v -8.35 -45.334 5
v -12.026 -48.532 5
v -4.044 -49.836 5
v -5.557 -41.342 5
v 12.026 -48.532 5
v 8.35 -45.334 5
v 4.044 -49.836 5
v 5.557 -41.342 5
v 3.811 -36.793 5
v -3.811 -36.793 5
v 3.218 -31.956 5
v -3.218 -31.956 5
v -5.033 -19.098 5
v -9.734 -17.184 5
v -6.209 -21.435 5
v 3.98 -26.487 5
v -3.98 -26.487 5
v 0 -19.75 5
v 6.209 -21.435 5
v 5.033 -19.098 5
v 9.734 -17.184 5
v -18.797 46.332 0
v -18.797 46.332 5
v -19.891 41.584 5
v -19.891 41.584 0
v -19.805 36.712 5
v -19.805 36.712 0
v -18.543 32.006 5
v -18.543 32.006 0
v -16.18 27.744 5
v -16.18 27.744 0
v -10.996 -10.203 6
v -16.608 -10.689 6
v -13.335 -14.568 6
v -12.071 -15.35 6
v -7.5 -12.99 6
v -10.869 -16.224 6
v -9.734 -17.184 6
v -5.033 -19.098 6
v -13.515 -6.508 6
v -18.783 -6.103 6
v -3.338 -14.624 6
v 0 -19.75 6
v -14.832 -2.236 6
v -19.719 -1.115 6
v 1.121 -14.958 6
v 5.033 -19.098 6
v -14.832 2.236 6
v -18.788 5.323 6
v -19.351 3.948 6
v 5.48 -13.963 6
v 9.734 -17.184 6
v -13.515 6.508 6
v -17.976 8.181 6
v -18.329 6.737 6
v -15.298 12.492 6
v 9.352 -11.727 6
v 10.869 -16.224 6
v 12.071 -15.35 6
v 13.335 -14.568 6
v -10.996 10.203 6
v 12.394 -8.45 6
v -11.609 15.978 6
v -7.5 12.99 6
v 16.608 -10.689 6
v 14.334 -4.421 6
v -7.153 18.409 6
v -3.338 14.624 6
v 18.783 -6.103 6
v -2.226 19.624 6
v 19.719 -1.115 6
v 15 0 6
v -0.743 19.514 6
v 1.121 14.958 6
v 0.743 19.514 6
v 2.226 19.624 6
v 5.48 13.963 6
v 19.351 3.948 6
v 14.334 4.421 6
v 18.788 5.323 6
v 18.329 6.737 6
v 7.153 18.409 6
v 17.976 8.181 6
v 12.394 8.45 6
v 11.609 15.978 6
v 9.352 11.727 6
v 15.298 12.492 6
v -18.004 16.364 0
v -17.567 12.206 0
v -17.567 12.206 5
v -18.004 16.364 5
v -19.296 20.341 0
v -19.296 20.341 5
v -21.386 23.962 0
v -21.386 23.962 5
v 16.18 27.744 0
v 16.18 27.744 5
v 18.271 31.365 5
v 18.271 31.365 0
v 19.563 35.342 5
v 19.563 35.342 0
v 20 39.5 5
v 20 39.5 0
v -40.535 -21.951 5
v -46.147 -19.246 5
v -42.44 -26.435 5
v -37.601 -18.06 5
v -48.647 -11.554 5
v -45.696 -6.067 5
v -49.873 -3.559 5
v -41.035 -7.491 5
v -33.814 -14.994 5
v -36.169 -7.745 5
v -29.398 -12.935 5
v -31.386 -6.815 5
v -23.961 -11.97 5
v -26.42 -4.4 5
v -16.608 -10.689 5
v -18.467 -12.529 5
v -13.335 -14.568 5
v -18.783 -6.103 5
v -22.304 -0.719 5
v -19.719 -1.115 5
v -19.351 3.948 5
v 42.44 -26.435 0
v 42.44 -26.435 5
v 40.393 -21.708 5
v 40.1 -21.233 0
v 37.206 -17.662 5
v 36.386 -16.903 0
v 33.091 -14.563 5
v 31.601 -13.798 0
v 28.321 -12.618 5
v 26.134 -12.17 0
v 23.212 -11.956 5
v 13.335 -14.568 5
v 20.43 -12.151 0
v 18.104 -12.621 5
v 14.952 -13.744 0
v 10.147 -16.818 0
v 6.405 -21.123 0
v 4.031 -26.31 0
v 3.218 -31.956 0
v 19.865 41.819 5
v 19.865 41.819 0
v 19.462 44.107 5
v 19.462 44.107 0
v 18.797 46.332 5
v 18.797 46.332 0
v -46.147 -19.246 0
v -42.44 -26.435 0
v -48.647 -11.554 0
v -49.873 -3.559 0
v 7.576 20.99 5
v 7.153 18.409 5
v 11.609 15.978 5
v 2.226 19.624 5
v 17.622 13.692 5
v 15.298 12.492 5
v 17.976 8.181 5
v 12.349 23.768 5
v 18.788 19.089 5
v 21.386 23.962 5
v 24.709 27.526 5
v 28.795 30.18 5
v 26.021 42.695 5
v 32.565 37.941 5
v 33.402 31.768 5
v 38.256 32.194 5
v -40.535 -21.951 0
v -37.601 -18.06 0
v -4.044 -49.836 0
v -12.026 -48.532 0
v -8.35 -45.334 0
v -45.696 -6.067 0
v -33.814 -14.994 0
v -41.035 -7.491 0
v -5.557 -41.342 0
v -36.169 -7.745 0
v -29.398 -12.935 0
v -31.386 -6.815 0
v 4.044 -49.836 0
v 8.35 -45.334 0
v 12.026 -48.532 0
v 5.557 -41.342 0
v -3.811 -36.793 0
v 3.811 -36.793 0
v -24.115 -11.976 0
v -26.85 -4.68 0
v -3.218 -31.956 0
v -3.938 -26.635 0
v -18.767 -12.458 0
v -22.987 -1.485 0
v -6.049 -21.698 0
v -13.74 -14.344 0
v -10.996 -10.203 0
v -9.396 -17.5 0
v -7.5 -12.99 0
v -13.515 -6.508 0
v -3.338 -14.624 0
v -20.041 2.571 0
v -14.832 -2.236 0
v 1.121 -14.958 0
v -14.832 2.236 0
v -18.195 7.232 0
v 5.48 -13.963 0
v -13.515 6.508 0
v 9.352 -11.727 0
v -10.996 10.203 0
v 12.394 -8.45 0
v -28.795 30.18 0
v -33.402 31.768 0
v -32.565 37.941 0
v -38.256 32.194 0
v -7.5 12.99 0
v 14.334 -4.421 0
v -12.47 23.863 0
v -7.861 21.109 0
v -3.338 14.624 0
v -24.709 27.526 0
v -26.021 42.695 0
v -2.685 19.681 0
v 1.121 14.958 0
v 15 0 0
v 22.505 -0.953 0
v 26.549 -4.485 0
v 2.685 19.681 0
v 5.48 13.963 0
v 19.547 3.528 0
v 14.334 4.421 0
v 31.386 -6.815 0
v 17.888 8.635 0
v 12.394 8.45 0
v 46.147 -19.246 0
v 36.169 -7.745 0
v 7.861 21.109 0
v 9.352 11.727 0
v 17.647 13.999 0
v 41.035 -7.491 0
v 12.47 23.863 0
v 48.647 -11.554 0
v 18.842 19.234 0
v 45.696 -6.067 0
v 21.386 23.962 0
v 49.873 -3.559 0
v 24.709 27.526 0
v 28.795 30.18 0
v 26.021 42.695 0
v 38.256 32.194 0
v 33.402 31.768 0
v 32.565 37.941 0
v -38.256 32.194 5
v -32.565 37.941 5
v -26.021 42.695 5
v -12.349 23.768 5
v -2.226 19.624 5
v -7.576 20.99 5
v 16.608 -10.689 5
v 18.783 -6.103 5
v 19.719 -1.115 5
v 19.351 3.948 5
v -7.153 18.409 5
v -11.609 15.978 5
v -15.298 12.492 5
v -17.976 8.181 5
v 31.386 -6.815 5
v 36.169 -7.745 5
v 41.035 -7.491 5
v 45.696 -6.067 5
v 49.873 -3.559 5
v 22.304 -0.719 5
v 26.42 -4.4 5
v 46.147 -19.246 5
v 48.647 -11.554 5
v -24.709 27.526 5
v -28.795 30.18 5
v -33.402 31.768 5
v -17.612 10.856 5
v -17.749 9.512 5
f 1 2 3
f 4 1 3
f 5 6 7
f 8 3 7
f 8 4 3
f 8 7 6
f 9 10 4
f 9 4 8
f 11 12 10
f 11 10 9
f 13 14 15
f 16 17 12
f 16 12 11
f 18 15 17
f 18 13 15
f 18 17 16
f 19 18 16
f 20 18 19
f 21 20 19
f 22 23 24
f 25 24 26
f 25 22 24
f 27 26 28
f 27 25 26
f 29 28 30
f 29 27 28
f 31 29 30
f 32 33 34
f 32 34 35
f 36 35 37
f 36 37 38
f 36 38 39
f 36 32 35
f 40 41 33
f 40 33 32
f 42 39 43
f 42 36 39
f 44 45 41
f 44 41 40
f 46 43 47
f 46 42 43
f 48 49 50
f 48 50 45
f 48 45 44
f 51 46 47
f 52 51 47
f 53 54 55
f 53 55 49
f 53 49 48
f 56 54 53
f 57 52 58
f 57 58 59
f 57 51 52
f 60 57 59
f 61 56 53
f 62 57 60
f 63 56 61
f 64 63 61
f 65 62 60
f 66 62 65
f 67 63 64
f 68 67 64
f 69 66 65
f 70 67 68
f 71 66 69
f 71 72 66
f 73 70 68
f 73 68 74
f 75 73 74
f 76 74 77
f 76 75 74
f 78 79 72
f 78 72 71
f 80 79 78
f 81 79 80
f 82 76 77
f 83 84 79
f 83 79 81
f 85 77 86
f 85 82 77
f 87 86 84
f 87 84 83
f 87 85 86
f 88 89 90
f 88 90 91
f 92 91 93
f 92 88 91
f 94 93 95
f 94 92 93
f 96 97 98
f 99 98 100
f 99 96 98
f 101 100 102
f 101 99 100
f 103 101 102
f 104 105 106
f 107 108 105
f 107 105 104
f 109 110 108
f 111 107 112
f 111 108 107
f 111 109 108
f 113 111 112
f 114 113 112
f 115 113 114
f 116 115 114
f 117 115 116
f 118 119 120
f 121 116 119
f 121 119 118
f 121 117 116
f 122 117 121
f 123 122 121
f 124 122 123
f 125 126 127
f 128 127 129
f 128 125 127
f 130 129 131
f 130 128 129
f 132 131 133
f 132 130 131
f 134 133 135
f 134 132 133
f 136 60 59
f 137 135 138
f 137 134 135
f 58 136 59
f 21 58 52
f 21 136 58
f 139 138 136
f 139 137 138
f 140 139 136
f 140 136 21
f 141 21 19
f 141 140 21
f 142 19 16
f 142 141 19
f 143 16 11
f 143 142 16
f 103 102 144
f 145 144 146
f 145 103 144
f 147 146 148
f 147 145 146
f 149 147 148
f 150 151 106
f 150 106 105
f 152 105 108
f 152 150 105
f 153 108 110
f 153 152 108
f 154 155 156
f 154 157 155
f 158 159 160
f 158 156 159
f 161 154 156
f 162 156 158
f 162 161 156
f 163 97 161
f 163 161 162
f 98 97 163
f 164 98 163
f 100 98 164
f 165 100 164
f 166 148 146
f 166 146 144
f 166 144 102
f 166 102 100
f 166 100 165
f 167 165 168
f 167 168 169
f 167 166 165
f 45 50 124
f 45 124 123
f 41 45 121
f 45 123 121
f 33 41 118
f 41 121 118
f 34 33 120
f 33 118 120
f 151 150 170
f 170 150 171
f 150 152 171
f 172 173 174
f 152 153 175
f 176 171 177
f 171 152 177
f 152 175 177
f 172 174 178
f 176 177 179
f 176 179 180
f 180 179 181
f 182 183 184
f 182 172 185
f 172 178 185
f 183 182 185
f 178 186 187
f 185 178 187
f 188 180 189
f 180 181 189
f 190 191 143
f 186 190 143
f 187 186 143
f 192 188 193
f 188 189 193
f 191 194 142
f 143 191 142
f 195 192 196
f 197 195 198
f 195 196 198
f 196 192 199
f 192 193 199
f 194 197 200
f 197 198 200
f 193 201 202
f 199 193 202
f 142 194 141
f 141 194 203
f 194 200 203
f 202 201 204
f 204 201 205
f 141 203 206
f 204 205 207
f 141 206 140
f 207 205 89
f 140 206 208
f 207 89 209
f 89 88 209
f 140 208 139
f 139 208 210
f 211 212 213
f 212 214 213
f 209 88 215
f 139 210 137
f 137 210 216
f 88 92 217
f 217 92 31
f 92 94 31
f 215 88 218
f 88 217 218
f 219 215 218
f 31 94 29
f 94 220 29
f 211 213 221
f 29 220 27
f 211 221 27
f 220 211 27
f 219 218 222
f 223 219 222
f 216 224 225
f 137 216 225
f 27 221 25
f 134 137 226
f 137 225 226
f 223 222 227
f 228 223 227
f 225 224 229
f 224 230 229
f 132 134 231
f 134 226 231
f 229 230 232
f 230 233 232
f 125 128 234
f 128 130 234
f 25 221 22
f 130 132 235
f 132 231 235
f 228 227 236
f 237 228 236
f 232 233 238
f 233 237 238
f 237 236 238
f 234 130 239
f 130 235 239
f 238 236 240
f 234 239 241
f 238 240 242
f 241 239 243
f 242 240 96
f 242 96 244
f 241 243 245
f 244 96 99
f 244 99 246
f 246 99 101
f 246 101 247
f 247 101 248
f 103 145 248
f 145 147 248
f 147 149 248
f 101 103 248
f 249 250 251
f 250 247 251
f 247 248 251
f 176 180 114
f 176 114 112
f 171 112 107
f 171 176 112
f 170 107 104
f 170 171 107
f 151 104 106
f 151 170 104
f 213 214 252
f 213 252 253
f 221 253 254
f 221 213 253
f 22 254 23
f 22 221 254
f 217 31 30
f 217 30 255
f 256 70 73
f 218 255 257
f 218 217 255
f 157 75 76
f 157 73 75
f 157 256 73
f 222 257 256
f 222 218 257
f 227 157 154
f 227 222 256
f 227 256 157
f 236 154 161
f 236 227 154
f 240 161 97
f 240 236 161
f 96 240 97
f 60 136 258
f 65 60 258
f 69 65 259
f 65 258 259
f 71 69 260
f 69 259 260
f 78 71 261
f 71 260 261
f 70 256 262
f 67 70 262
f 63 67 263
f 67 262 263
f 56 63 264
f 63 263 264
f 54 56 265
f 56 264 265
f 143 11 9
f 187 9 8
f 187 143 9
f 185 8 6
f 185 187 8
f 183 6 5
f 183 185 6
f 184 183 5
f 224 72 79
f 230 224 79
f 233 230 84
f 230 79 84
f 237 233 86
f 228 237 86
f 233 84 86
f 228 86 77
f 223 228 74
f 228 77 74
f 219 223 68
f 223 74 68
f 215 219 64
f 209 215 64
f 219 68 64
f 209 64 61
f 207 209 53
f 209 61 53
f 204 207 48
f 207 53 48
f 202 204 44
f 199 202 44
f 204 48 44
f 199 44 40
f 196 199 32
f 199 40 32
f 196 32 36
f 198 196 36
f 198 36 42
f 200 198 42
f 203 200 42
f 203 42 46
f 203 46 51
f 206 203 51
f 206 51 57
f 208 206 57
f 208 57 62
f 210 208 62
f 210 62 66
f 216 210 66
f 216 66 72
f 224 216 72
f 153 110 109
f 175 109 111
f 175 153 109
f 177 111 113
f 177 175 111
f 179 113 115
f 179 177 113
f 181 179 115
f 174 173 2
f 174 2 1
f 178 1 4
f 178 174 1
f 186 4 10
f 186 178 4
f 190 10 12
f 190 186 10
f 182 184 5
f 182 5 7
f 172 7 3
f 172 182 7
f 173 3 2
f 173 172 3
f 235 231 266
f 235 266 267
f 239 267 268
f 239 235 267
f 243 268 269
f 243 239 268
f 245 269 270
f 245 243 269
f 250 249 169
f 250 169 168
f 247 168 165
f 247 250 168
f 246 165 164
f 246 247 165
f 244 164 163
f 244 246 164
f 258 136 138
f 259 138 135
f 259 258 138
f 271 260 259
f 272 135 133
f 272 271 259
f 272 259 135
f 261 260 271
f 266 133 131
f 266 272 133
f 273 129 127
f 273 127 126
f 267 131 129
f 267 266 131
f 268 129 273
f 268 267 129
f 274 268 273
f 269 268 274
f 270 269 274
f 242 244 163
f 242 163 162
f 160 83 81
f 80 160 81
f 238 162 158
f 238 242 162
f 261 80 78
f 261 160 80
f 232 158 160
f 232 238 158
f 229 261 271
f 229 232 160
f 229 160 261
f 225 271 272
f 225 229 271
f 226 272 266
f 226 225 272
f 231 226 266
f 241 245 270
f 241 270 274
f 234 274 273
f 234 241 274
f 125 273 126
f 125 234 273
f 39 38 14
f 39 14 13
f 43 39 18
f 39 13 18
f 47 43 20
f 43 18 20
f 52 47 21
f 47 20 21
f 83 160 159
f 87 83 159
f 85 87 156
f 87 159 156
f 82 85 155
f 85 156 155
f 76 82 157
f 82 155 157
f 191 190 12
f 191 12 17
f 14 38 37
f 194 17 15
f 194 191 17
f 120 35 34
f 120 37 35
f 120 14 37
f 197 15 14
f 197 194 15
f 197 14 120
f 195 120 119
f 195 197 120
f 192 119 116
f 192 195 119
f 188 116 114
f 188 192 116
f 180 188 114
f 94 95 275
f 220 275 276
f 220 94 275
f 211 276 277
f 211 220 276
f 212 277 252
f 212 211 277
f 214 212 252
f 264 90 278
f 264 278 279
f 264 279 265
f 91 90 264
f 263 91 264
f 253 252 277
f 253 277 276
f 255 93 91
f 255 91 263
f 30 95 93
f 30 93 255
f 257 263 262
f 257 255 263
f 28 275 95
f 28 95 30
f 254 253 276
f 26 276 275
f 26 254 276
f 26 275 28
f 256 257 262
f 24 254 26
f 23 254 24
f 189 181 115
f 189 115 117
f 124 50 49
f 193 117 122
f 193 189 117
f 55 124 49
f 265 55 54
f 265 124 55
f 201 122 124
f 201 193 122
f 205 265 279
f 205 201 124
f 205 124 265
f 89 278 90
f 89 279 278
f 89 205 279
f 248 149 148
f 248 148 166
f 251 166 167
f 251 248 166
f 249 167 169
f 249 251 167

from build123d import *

# Parameters (mm, degrees)
F0_R     = 60
F1_DEPTH = 5
F2_R     = 19.75
F3_DEPTH = 1
F4_DEPTH = 25
F5_R     = 60
F6_DEPTH = 25
F7_R     = 15
F8_DEPTH = 25


with BuildPart() as f1:
    # F0 (on Top) → F1 (new body)
    with BuildSketch(Plane.XY):
        Circle(F0_R)
        with BuildLine():
            ThreePointArc((57.5667323937, 12.2061712778), (49.3224374395, -3.9741686097), (31.3863925062, -6.8149590481))
            Line((31.3863925062, -6.8149590481), (29.3978573531, -12.9350409519))
            ThreePointArc((29.3978573531, -12.9350409519), (39.3978573531, -20.200466232), (43.2175174656, -31.9561712778))
            ThreePointArc((43.2175174656, -31.9561712778), (23.2175174656, -51.9561712778), (3.2175174656, -31.9561712778))
            Line((3.2175174656, -31.9561712778), (-3.2175174656, -31.9561712778))
            ThreePointArc((-3.2175174656, -31.9561712778), (-34.9732225114, -48.1365111653), (-29.3978573531, -12.9350409519))
            Line((-29.3978573531, -12.9350409519), (-31.3863925062, -6.8149590481))
            ThreePointArc((-31.3863925062, -6.8149590481), (-56.5878627196, 18.3865111653), (-21.3863925062, 23.9618763237))
            Line((-21.3863925062, 23.9618763237), (-16.1803398875, 27.7442949542))
            ThreePointArc((-16.1803398875, 27.7442949542), (-6.1803398875, 58.5211303259), (20, 39.5))
            ThreePointArc((20, 39.5), (19.0211303259, 33.3196601125), (16.1803398875, 27.7442949542))
            Line((16.1803398875, 27.7442949542), (21.3863925062, 23.9618763237))
            ThreePointArc((21.3863925062, 23.9618763237), (43.7470722812, 31.2273016037), (57.5667323937, 12.2061712778))
        make_face(mode=Mode.SUBTRACT)
        with BuildLine():
            Line((-37.5667323937, 12.2061712778), (-21.3863925062, 23.9618763237))
            ThreePointArc((-21.3863925062, 23.9618763237), (-56.5878627196, 18.3865111653), (-31.3863925062, -6.8149590481))
            Line((-31.3863925062, -6.8149590481), (-37.5667323937, 12.2061712778))
        make_face()
        with BuildLine():
            ThreePointArc((-17.5667323937, 12.2061712778), (-18.5456020678, 18.3865111653), (-21.3863925062, 23.9618763237))
            Line((-21.3863925062, 23.9618763237), (-37.5667323937, 12.2061712778))
            Line((-37.5667323937, 12.2061712778), (-31.3863925062, -6.8149590481))
            ThreePointArc((-31.3863925062, -6.8149590481), (-21.3863925062, 0.450466232), (-17.5667323937, 12.2061712778))
        make_face()
        with BuildLine():
            ThreePointArc((-29.3978573531, -12.9350409519), (-34.9732225114, -48.1365111653), (-3.2175174656, -31.9561712778))
            Line((-3.2175174656, -31.9561712778), (-23.2175174656, -31.9561712778))
            Line((-23.2175174656, -31.9561712778), (-29.3978573531, -12.9350409519))
        make_face()
        with BuildLine():
            Line((-23.2175174656, -31.9561712778), (-3.2175174656, -31.9561712778))
            ThreePointArc((-3.2175174656, -31.9561712778), (-11.4618124197, -15.7758313903), (-29.3978573531, -12.9350409519))
            Line((-29.3978573531, -12.9350409519), (-23.2175174656, -31.9561712778))
        make_face()
        with BuildLine():
            ThreePointArc((43.2175174656, -31.9561712778), (39.3978573531, -20.200466232), (29.3978573531, -12.9350409519))
            Line((29.3978573531, -12.9350409519), (23.2175174656, -31.9561712778))
            Line((23.2175174656, -31.9561712778), (3.2175174656, -31.9561712778))
            ThreePointArc((3.2175174656, -31.9561712778), (23.2175174656, -51.9561712778), (43.2175174656, -31.9561712778))
        make_face()
        with BuildLine():
            Line((23.2175174656, -31.9561712778), (29.3978573531, -12.9350409519))
            ThreePointArc((29.3978573531, -12.9350409519), (11.4618124197, -15.7758313903), (3.2175174656, -31.9561712778))
            Line((3.2175174656, -31.9561712778), (23.2175174656, -31.9561712778))
        make_face()
        with BuildLine():
            Line((29.3978573531, -12.9350409519), (31.3863925062, -6.8149590481))
            ThreePointArc((31.3863925062, -6.8149590481), (18.5456020678, 6.0258313903), (21.3863925062, 23.9618763237))
            Line((21.3863925062, 23.9618763237), (16.1803398875, 27.7442949542))
            ThreePointArc((16.1803398875, 27.7442949542), (0, 19.5), (-16.1803398875, 27.7442949542))
            Line((-16.1803398875, 27.7442949542), (-21.3863925062, 23.9618763237))
            ThreePointArc((-21.3863925062, 23.9618763237), (-18.5456020678, 18.3865111653), (-17.5667323937, 12.2061712778))
            ThreePointArc((-17.5667323937, 12.2061712778), (-21.3863925062, 0.450466232), (-31.3863925062, -6.8149590481))
            Line((-31.3863925062, -6.8149590481), (-29.3978573531, -12.9350409519))
            ThreePointArc((-29.3978573531, -12.9350409519), (-11.4618124197, -15.7758313903), (-3.2175174656, -31.9561712778))
            Line((-3.2175174656, -31.9561712778), (3.2175174656, -31.9561712778))
            ThreePointArc((3.2175174656, -31.9561712778), (11.4618124197, -15.7758313903), (29.3978573531, -12.9350409519))
        make_face()
        with BuildLine():
            Line((31.3863925062, -6.8149590481), (37.5667323937, 12.2061712778))
            Line((37.5667323937, 12.2061712778), (21.3863925062, 23.9618763237))
            ThreePointArc((21.3863925062, 23.9618763237), (18.5456020678, 6.0258313903), (31.3863925062, -6.8149590481))
        make_face()
        with BuildLine():
            Line((21.3863925062, 23.9618763237), (37.5667323937, 12.2061712778))
            Line((37.5667323937, 12.2061712778), (31.3863925062, -6.8149590481))
            ThreePointArc((31.3863925062, -6.8149590481), (49.3224374395, -3.9741686097), (57.5667323937, 12.2061712778))
            ThreePointArc((57.5667323937, 12.2061712778), (43.7470722812, 31.2273016037), (21.3863925062, 23.9618763237))
        make_face()
        with BuildLine():
            ThreePointArc((-16.1803398875, 27.7442949542), (0, 19.5), (16.1803398875, 27.7442949542))
            Line((16.1803398875, 27.7442949542), (0, 39.5))
            Line((0, 39.5), (-16.1803398875, 27.7442949542))
        make_face()
        with BuildLine():
            Line((0, 39.5), (16.1803398875, 27.7442949542))
            ThreePointArc((16.1803398875, 27.7442949542), (19.0211303259, 33.3196601125), (20, 39.5))
            ThreePointArc((20, 39.5), (-6.1803398875, 58.5211303259), (-16.1803398875, 27.7442949542))
            Line((-16.1803398875, 27.7442949542), (0, 39.5))
        make_face()
    extrude(amount=F1_DEPTH)

    # F2 (on face) → F3 (join)
    with BuildSketch(Plane.XY.offset(5)):
        Circle(F2_R)
    extrude(amount=F3_DEPTH)

    # F0 (on Top) → F4 (cut)
    with BuildSketch(Plane.XY):
        with BuildLine():
            ThreePointArc((-29.3978573531, -12.9350409519), (-34.9732225114, -48.1365111653), (-3.2175174656, -31.9561712778))
            Line((-3.2175174656, -31.9561712778), (-23.2175174656, -31.9561712778))
            Line((-23.2175174656, -31.9561712778), (-29.3978573531, -12.9350409519))
        make_face()
        with BuildLine():
            Line((-23.2175174656, -31.9561712778), (-3.2175174656, -31.9561712778))
            ThreePointArc((-3.2175174656, -31.9561712778), (-11.4618124197, -15.7758313903), (-29.3978573531, -12.9350409519))
            Line((-29.3978573531, -12.9350409519), (-23.2175174656, -31.9561712778))
        make_face()
        with BuildLine():
            ThreePointArc((43.2175174656, -31.9561712778), (39.3978573531, -20.200466232), (29.3978573531, -12.9350409519))
            Line((29.3978573531, -12.9350409519), (23.2175174656, -31.9561712778))
            Line((23.2175174656, -31.9561712778), (3.2175174656, -31.9561712778))
            ThreePointArc((3.2175174656, -31.9561712778), (23.2175174656, -51.9561712778), (43.2175174656, -31.9561712778))
        make_face()
        with BuildLine():
            Line((23.2175174656, -31.9561712778), (29.3978573531, -12.9350409519))
            ThreePointArc((29.3978573531, -12.9350409519), (11.4618124197, -15.7758313903), (3.2175174656, -31.9561712778))
            Line((3.2175174656, -31.9561712778), (23.2175174656, -31.9561712778))
        make_face()
        with BuildLine():
            Line((21.3863925062, 23.9618763237), (37.5667323937, 12.2061712778))
            Line((37.5667323937, 12.2061712778), (31.3863925062, -6.8149590481))
            ThreePointArc((31.3863925062, -6.8149590481), (49.3224374395, -3.9741686097), (57.5667323937, 12.2061712778))
            ThreePointArc((57.5667323937, 12.2061712778), (43.7470722812, 31.2273016037), (21.3863925062, 23.9618763237))
        make_face()
        with BuildLine():
            Line((31.3863925062, -6.8149590481), (37.5667323937, 12.2061712778))
            Line((37.5667323937, 12.2061712778), (21.3863925062, 23.9618763237))
            ThreePointArc((21.3863925062, 23.9618763237), (18.5456020678, 6.0258313903), (31.3863925062, -6.8149590481))
        make_face()
        with BuildLine():
            ThreePointArc((-16.1803398875, 27.7442949542), (0, 19.5), (16.1803398875, 27.7442949542))
            Line((16.1803398875, 27.7442949542), (0, 39.5))
            Line((0, 39.5), (-16.1803398875, 27.7442949542))
        make_face()
        with BuildLine():
            Line((0, 39.5), (16.1803398875, 27.7442949542))
            ThreePointArc((16.1803398875, 27.7442949542), (19.0211303259, 33.3196601125), (20, 39.5))
            ThreePointArc((20, 39.5), (-6.1803398875, 58.5211303259), (-16.1803398875, 27.7442949542))
            Line((-16.1803398875, 27.7442949542), (0, 39.5))
        make_face()
        with BuildLine():
            Line((-37.5667323937, 12.2061712778), (-21.3863925062, 23.9618763237))
            ThreePointArc((-21.3863925062, 23.9618763237), (-56.5878627196, 18.3865111653), (-31.3863925062, -6.8149590481))
            Line((-31.3863925062, -6.8149590481), (-37.5667323937, 12.2061712778))
        make_face()
        with BuildLine():
            ThreePointArc((-17.5667323937, 12.2061712778), (-18.5456020678, 18.3865111653), (-21.3863925062, 23.9618763237))
            Line((-21.3863925062, 23.9618763237), (-37.5667323937, 12.2061712778))
            Line((-37.5667323937, 12.2061712778), (-31.3863925062, -6.8149590481))
            ThreePointArc((-31.3863925062, -6.8149590481), (-21.3863925062, 0.450466232), (-17.5667323937, 12.2061712778))
        make_face()
    extrude(amount=F4_DEPTH, mode=Mode.SUBTRACT)

    # F5 (on face) → F6 (cut)
    with BuildSketch(Plane.XY):
        Circle(F5_R)
        with BuildLine():
            ThreePointArc((18.7968074618, 46.332278481), (29.3892626146, 40.4508497187), (38.2560824185, 32.1942876609))
            ThreePointArc((38.2560824185, 32.1942876609), (51.9505253652, 26.1024477486), (57.5667323937, 12.2061712778))
            ThreePointArc((57.5667323937, 12.2061712778), (55.5407180163, 3.4348634598), (49.8731483099, -3.5593647834))
            ThreePointArc((49.8731483099, -3.5593647834), (47.5528258148, -15.4508497187), (42.4403666729, -26.435114463))
            ThreePointArc((42.4403666729, -26.435114463), (43.0222767944, -29.1684288351), (43.2175174656, -31.9561712778))
            ThreePointArc((43.2175174656, -31.9561712778), (32.6031319122, -49.6171520393), (12.0264933196, -48.5320868955))
            ThreePointArc((12.0264933196, -48.5320868955), (0, -50), (-12.0264933196, -48.5320868955))
            ThreePointArc((-12.0264933196, -48.5320868955), (-34.9732225114, -48.1365111653), (-42.4403666729, -26.435114463))
            ThreePointArc((-42.4403666729, -26.435114463), (-47.5528258148, -15.4508497187), (-49.8731483099, -3.5593647834))
            ThreePointArc((-49.8731483099, -3.5593647834), (-56.5878627196, 18.3865111653), (-38.2560824185, 32.1942876609))
            ThreePointArc((-38.2560824185, 32.1942876609), (-29.3892626146, 40.4508497187), (-18.7968074618, 46.332278481))
            ThreePointArc((-18.7968074619, 46.332278481), (0, 59.5), (18.7968074619, 46.332278481))
        make_face(mode=Mode.SUBTRACT)
    extrude(amount=F6_DEPTH, mode=Mode.SUBTRACT)

    # F7 (on face) → F8 (cut)
    with BuildSketch(Plane.XY.offset(6)):
        Circle(F7_R)
    extrude(amount=-F8_DEPTH, mode=Mode.SUBTRACT)


solid = f1.part
